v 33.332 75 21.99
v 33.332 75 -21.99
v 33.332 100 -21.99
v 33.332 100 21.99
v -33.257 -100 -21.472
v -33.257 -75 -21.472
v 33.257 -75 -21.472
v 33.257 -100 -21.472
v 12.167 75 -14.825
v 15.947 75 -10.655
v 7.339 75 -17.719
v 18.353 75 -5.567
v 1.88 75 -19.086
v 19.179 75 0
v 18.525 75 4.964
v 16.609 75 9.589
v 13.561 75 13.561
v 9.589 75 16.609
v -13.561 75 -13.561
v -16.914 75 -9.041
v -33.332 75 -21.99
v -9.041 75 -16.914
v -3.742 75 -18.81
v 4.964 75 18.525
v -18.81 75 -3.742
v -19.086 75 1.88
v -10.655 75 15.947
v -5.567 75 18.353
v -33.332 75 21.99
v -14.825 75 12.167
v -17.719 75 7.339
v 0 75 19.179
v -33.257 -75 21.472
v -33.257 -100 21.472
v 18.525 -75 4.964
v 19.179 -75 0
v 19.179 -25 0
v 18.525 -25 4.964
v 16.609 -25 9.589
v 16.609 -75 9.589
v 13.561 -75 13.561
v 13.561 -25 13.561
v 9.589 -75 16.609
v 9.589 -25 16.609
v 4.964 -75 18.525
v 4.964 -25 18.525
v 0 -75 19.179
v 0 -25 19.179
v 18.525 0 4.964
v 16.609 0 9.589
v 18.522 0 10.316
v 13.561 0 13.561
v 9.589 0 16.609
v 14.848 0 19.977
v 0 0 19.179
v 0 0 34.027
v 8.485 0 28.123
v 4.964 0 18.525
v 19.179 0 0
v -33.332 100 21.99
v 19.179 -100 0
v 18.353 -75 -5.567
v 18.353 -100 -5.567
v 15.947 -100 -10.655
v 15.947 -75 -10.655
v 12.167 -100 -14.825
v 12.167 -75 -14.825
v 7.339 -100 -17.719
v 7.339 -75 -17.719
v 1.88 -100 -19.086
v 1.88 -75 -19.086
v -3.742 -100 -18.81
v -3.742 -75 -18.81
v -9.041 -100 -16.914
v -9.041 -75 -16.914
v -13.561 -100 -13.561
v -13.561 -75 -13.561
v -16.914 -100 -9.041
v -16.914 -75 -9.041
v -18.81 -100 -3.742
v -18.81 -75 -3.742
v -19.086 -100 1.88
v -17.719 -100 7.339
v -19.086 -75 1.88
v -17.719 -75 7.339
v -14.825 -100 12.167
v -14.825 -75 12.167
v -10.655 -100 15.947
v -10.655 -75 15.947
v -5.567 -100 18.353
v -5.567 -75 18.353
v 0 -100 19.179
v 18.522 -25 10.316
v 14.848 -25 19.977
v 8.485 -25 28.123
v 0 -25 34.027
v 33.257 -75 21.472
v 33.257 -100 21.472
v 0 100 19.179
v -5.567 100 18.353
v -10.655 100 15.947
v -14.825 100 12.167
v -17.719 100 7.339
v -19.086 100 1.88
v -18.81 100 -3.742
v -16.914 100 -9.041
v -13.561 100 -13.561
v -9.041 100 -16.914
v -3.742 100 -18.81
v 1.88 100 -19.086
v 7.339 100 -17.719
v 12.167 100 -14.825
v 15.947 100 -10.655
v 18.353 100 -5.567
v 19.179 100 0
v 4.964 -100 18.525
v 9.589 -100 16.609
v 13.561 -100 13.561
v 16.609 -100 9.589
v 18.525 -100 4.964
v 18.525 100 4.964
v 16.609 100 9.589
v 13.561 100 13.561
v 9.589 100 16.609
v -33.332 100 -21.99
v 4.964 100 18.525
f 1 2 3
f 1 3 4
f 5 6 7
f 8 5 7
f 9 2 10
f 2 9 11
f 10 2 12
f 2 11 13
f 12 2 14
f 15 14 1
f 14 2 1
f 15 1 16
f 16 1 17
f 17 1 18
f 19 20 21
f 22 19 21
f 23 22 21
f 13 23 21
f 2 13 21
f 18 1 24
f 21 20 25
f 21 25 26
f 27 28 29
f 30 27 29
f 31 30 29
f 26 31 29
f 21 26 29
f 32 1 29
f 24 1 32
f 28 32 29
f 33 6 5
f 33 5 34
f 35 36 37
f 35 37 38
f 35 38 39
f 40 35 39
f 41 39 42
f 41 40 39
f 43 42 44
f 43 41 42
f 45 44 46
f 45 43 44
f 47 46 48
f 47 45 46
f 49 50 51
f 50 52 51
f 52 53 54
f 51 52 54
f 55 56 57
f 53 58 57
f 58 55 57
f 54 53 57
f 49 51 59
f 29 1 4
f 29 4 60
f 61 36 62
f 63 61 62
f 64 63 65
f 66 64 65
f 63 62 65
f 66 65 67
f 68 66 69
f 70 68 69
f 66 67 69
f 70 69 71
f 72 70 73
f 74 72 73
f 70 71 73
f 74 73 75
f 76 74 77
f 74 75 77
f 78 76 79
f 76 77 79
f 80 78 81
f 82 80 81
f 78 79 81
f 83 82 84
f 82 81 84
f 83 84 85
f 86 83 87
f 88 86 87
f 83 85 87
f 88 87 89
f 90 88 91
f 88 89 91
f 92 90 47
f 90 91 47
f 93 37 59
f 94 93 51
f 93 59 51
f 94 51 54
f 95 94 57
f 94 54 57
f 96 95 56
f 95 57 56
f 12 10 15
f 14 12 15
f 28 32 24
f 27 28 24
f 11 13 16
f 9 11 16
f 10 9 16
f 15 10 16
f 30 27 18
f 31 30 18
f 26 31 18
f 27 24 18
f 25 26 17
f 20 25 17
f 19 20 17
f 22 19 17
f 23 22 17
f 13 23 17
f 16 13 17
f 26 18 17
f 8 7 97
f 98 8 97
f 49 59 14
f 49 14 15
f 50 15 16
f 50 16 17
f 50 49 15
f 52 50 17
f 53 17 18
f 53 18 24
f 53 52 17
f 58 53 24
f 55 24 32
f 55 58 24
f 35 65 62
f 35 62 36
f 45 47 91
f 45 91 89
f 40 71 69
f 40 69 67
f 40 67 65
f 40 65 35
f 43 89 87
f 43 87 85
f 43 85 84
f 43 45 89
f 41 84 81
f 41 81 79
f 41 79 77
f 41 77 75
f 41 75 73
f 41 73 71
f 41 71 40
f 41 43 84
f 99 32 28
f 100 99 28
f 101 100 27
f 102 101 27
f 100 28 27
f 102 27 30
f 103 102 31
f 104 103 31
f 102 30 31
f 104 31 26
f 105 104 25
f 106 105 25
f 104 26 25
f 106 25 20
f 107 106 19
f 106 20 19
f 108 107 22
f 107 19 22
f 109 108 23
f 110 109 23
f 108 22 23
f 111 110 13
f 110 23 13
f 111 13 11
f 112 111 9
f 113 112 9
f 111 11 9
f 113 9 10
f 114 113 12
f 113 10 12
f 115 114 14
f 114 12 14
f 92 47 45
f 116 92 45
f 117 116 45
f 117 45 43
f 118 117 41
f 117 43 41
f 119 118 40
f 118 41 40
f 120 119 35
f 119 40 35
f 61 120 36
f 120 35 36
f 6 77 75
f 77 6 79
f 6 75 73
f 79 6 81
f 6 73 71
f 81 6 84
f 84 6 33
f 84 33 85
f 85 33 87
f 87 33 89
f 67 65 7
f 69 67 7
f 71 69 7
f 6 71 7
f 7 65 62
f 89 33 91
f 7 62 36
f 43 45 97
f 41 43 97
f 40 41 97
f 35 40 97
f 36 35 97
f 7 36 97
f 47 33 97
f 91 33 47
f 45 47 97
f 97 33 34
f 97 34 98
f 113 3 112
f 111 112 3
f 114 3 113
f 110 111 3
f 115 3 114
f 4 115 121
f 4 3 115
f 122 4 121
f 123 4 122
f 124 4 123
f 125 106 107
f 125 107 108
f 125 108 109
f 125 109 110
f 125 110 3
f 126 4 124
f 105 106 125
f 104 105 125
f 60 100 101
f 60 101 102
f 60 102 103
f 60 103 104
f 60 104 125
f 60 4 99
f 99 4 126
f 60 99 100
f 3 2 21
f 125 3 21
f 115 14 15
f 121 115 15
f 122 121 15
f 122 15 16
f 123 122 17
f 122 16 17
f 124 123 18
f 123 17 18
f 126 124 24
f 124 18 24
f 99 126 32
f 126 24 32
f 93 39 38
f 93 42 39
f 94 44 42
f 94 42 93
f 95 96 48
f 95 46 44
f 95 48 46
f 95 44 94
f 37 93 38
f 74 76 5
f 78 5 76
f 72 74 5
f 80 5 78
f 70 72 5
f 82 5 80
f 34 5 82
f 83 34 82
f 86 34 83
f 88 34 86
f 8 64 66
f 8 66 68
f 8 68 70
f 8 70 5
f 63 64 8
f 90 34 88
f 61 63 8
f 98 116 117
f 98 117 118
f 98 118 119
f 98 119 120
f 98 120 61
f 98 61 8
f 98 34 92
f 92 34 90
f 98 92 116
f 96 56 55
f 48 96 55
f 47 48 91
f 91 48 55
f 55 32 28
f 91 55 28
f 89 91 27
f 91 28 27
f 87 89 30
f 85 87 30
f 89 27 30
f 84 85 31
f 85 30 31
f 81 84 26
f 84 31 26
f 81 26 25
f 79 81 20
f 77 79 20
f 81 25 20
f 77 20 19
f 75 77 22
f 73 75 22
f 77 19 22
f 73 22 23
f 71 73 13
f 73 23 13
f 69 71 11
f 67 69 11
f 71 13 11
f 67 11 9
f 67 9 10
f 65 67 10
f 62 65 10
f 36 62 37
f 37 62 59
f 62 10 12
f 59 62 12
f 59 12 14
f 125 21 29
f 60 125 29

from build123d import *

# Parameters (mm, degrees)
F1_DEPTH = 75
F2_DEPTH = 25
F3_W     = 66.513658
F3_H     = 42.944946
F4_DEPTH = 25
F5_W     = 66.664488
F5_H     = 43.980044
F6_DEPTH = 25


with BuildPart() as f1:
    # F0 (on Front) → F1 (new body, symmetric)
    with BuildSketch(Plane.XZ):
        with BuildLine():
            ThreePointArc((0, 19.178839), (-13.561487, -13.561487), (19.178839, 0))
            ThreePointArc((19.178839, 0), (13.561487, 13.561487), (0, 19.178839))
        make_face()
    extrude(amount=F1_DEPTH, both=True)

    # F0 (on Front) → F2 (join)
    with BuildSketch(Plane.XZ):
        with BuildLine():
            ThreePointArc((0, 19.178839), (-13.561487, -13.561487), (19.178839, 0))
            ThreePointArc((19.178839, 0), (13.561487, 13.561487), (0, 19.178839))
        make_face()
        with BuildLine():
            ThreePointArc((0, 19.178839), (13.561487, 13.561487), (19.178839, 0))
            ThreePointArc((19.178839, 0), (14.847851, 19.977202), (0, 34.026664))
            Line((0, 34.026664), (0, 19.178839))
        make_face()
    extrude(amount=F2_DEPTH)


with BuildPart() as f4:
    # F3 (on face) → F4 (new body)
    with BuildSketch(Plane.XZ.offset(75)):
        Rectangle(F3_W, F3_H)
        with BuildLine():
            ThreePointArc((0, 19.178839), (13.561487, 13.561487), (19.178839, 0))
            ThreePointArc((19.178839, 0), (-13.561487, -13.561487), (0, 19.178839))
        make_face(mode=Mode.SUBTRACT)
    extrude(amount=F4_DEPTH)


with BuildPart() as f6:
    # F5 (on face) → F6 (new body)
    with BuildSketch(Plane(origin=(0, 75, 0), x_dir=(-1, 0, 0), z_dir=(0, 1, 0))):
        Rectangle(F5_W, F5_H)
        with BuildLine():
            ThreePointArc((-19.178839, 0), (-13.561487, 13.561487), (0, 19.178839))
            ThreePointArc((0, 19.178839), (13.561487, -13.561487), (-19.178839, 0))
        make_face(mode=Mode.SUBTRACT)
    extrude(amount=F6_DEPTH)


solid = Compound([f1.part, f4.part, f6.part])
